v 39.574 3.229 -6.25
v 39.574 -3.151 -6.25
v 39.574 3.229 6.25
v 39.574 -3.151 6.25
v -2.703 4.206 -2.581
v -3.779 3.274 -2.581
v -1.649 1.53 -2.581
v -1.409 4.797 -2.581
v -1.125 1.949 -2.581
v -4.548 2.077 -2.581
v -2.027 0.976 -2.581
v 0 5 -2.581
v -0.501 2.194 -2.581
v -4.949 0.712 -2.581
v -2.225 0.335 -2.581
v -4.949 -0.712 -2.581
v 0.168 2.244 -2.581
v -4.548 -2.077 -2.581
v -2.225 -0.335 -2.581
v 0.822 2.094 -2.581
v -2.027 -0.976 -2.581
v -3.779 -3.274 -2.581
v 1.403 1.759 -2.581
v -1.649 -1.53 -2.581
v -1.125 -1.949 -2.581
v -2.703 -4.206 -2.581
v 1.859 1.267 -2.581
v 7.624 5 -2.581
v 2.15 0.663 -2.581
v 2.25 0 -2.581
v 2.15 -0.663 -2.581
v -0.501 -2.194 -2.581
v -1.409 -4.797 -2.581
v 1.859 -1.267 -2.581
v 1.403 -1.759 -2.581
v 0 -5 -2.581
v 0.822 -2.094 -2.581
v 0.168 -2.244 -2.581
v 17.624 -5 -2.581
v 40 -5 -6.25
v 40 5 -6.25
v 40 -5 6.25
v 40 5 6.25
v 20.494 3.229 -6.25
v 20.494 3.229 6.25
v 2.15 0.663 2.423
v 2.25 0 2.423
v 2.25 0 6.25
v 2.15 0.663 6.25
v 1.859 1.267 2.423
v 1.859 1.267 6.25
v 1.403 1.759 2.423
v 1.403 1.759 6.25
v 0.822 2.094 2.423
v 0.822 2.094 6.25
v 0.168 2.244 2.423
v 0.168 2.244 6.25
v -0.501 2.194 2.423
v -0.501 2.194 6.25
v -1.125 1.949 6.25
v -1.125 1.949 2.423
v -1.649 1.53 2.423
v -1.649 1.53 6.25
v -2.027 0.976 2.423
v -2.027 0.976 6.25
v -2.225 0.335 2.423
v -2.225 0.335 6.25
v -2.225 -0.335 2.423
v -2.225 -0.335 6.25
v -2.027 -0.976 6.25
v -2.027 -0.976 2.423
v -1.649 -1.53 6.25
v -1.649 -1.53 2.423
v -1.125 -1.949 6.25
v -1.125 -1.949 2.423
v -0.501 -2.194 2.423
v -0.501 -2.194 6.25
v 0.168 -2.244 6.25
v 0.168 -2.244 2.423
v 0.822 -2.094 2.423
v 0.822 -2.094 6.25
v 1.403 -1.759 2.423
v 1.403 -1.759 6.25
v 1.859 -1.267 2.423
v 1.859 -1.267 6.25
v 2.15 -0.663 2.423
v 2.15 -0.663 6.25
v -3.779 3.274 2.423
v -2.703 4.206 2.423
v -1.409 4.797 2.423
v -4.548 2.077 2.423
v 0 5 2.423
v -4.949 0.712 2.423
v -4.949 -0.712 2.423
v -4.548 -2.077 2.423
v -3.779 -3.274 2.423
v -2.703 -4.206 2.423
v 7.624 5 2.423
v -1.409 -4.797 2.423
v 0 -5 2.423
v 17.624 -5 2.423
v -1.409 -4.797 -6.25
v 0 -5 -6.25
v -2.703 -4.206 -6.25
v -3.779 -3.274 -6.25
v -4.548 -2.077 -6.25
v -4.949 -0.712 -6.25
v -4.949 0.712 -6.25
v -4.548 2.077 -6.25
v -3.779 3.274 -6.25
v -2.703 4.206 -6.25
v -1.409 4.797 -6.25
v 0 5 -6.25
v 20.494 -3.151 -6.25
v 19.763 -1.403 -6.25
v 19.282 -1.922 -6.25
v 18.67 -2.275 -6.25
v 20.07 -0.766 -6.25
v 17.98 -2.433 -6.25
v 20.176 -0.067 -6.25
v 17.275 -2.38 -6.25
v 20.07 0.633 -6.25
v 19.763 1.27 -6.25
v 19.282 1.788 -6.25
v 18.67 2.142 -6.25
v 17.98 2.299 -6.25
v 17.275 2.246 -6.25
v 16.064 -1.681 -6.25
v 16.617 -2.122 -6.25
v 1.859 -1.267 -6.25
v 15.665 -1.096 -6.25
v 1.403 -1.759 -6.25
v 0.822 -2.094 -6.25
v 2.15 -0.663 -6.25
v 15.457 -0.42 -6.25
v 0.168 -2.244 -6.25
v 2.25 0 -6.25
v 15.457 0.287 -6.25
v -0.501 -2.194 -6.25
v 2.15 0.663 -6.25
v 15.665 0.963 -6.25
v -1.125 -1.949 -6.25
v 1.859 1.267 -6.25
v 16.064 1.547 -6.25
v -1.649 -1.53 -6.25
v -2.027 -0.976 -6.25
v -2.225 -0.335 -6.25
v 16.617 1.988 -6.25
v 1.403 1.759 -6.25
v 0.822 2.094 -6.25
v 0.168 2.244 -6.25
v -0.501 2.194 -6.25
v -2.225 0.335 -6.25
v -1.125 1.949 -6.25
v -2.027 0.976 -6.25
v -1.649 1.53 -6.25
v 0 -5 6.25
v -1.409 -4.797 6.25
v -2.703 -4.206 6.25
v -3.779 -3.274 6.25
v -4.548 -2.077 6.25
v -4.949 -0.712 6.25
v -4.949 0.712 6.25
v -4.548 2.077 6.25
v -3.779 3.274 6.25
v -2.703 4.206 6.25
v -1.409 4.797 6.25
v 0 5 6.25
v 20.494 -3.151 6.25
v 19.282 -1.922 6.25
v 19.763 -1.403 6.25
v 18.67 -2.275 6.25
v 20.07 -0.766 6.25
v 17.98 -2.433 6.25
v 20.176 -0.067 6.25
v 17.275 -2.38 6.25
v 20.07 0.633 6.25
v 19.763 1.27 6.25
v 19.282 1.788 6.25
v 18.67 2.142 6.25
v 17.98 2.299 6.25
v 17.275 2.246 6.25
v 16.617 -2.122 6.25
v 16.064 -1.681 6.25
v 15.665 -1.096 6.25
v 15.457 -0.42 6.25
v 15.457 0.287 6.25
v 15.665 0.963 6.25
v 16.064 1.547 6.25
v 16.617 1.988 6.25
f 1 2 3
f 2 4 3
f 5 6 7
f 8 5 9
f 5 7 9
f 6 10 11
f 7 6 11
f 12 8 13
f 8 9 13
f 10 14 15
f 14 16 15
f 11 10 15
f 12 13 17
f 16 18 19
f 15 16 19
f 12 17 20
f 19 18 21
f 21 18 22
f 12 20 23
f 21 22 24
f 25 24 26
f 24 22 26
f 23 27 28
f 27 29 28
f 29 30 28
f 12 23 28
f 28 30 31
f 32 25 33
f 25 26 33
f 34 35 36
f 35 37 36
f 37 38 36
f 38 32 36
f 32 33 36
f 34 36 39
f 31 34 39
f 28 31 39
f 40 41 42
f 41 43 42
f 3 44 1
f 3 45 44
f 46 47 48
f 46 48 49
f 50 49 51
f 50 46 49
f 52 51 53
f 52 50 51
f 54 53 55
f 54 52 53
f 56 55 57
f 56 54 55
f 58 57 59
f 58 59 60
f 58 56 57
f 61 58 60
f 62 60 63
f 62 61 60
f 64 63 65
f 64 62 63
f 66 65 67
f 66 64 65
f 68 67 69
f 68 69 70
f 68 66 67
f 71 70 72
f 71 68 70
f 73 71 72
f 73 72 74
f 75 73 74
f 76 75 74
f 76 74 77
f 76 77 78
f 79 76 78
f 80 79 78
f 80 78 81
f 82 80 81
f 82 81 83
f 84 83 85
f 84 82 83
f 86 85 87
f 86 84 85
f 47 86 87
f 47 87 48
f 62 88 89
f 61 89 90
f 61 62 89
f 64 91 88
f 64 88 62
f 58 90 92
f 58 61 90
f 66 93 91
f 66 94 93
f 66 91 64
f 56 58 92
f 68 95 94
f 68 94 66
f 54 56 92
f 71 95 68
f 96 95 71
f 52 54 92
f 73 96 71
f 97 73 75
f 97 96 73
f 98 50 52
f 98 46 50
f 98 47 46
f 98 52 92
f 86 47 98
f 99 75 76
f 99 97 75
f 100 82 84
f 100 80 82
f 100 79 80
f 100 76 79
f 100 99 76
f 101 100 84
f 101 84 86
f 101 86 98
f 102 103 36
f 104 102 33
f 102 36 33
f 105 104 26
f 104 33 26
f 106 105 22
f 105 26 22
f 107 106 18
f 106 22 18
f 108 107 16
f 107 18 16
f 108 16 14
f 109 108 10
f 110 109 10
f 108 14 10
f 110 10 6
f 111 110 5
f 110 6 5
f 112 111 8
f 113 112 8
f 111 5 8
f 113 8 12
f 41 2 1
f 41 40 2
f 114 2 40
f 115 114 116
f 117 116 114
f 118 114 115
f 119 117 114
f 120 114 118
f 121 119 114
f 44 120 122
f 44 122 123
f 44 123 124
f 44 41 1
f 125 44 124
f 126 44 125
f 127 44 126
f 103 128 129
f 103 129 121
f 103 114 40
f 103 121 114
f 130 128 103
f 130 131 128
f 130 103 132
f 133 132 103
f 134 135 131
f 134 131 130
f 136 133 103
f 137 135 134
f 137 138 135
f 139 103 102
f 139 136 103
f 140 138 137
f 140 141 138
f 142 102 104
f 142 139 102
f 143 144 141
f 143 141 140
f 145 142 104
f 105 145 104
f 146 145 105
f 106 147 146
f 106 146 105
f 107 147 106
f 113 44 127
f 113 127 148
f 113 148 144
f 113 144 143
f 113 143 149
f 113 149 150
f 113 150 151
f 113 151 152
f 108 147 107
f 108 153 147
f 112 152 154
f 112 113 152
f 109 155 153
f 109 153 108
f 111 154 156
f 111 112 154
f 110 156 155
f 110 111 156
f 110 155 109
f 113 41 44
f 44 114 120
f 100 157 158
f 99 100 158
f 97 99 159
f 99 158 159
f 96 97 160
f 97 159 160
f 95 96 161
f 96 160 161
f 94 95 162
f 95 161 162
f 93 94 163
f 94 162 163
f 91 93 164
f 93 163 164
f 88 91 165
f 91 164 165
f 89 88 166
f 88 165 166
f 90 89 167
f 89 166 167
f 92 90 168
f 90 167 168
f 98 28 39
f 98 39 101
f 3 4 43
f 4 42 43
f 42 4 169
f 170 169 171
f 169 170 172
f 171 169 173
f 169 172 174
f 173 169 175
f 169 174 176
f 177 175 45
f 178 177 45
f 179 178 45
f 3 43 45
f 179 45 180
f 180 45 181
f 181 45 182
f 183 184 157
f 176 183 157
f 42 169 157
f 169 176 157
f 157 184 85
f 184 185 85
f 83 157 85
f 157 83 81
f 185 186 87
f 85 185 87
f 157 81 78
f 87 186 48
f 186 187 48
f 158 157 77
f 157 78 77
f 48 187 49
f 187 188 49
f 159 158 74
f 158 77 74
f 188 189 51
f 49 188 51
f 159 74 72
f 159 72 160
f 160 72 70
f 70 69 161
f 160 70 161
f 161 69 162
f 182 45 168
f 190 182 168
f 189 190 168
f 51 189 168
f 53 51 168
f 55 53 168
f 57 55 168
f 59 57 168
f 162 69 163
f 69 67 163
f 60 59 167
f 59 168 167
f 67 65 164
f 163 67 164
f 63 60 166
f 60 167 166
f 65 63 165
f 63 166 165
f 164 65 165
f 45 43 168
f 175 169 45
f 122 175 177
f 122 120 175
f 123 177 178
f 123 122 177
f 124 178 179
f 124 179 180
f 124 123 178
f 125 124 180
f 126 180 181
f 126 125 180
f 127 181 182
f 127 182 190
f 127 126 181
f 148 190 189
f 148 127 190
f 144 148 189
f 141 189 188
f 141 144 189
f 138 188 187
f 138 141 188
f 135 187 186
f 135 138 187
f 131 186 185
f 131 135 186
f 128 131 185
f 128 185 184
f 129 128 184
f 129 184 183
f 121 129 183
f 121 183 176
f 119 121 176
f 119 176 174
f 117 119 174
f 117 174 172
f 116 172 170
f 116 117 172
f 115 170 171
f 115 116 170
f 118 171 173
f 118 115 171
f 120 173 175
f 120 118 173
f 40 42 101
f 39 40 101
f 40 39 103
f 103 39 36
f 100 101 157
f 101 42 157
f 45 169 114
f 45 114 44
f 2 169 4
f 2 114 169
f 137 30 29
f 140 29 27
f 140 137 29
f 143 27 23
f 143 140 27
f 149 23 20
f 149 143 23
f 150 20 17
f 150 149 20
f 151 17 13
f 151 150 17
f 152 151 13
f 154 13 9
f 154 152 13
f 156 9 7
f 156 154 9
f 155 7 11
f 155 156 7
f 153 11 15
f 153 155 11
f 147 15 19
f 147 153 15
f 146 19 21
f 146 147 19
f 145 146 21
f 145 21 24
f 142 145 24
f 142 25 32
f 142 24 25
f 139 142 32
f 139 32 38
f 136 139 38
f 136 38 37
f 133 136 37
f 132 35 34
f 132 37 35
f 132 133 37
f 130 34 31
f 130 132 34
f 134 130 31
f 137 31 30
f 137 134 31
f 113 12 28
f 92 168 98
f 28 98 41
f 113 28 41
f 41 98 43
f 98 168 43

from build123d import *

# Parameters (mm, degrees)
SKETCH1_R           = 2.25
SKETCH1_R_2         = 2.37266458
SKETCH1_W           = 19.08
SKETCH1_H           = 6.38
BOSS_EXTRUDE1_DEPTH = 6.25
SKETCH13_W          = 12.867541265
SKETCH13_H          = 5.004043825
CUT_EXTRUDE1_DEPTH  = 10
CHAMFER1_SIZE       = 10


with BuildPart() as part:
    # Sketch1 → Boss-Extrude1 (new, symmetric)
    with BuildSketch(Plane.XY):
        with BuildLine():
            Line((0, 5), (40, 5))
            Line((40, 5), (40, -5))
            Line((40, -5), (0, -5))
            ThreePointArc((0, -5), (-5, 0), (0, 5))
        make_face()
        Circle(SKETCH1_R, mode=Mode.SUBTRACT)
        with Locations((17.802904034, -0.066795827)):
            Circle(SKETCH1_R_2, mode=Mode.SUBTRACT)
        with Locations((30.033910385, 0.039223356)):
            Rectangle(SKETCH1_W, SKETCH1_H, mode=Mode.SUBTRACT)
    extrude(amount=BOSS_EXTRUDE1_DEPTH, both=True)

    # Sketch13 → Cut-Extrude1 (cut)
    with BuildSketch(Plane.XZ.offset(5)):
        with Locations((1.190063179, -0.07942928)):
            Rectangle(SKETCH13_W, SKETCH13_H)
    extrude(amount=-CUT_EXTRUDE1_DEPTH, mode=Mode.SUBTRACT)

    # Chamfer1
    chamfer1_edges = [part.edges().sort_by_distance(p)[0] for p in [
        (7.623833811, -5, -0.07942928),
    ]]
    chamfer(chamfer1_edges, length=CHAMFER1_SIZE - 0.0001)  # a hair under: the kernel refuses the full size


solid = part.part
